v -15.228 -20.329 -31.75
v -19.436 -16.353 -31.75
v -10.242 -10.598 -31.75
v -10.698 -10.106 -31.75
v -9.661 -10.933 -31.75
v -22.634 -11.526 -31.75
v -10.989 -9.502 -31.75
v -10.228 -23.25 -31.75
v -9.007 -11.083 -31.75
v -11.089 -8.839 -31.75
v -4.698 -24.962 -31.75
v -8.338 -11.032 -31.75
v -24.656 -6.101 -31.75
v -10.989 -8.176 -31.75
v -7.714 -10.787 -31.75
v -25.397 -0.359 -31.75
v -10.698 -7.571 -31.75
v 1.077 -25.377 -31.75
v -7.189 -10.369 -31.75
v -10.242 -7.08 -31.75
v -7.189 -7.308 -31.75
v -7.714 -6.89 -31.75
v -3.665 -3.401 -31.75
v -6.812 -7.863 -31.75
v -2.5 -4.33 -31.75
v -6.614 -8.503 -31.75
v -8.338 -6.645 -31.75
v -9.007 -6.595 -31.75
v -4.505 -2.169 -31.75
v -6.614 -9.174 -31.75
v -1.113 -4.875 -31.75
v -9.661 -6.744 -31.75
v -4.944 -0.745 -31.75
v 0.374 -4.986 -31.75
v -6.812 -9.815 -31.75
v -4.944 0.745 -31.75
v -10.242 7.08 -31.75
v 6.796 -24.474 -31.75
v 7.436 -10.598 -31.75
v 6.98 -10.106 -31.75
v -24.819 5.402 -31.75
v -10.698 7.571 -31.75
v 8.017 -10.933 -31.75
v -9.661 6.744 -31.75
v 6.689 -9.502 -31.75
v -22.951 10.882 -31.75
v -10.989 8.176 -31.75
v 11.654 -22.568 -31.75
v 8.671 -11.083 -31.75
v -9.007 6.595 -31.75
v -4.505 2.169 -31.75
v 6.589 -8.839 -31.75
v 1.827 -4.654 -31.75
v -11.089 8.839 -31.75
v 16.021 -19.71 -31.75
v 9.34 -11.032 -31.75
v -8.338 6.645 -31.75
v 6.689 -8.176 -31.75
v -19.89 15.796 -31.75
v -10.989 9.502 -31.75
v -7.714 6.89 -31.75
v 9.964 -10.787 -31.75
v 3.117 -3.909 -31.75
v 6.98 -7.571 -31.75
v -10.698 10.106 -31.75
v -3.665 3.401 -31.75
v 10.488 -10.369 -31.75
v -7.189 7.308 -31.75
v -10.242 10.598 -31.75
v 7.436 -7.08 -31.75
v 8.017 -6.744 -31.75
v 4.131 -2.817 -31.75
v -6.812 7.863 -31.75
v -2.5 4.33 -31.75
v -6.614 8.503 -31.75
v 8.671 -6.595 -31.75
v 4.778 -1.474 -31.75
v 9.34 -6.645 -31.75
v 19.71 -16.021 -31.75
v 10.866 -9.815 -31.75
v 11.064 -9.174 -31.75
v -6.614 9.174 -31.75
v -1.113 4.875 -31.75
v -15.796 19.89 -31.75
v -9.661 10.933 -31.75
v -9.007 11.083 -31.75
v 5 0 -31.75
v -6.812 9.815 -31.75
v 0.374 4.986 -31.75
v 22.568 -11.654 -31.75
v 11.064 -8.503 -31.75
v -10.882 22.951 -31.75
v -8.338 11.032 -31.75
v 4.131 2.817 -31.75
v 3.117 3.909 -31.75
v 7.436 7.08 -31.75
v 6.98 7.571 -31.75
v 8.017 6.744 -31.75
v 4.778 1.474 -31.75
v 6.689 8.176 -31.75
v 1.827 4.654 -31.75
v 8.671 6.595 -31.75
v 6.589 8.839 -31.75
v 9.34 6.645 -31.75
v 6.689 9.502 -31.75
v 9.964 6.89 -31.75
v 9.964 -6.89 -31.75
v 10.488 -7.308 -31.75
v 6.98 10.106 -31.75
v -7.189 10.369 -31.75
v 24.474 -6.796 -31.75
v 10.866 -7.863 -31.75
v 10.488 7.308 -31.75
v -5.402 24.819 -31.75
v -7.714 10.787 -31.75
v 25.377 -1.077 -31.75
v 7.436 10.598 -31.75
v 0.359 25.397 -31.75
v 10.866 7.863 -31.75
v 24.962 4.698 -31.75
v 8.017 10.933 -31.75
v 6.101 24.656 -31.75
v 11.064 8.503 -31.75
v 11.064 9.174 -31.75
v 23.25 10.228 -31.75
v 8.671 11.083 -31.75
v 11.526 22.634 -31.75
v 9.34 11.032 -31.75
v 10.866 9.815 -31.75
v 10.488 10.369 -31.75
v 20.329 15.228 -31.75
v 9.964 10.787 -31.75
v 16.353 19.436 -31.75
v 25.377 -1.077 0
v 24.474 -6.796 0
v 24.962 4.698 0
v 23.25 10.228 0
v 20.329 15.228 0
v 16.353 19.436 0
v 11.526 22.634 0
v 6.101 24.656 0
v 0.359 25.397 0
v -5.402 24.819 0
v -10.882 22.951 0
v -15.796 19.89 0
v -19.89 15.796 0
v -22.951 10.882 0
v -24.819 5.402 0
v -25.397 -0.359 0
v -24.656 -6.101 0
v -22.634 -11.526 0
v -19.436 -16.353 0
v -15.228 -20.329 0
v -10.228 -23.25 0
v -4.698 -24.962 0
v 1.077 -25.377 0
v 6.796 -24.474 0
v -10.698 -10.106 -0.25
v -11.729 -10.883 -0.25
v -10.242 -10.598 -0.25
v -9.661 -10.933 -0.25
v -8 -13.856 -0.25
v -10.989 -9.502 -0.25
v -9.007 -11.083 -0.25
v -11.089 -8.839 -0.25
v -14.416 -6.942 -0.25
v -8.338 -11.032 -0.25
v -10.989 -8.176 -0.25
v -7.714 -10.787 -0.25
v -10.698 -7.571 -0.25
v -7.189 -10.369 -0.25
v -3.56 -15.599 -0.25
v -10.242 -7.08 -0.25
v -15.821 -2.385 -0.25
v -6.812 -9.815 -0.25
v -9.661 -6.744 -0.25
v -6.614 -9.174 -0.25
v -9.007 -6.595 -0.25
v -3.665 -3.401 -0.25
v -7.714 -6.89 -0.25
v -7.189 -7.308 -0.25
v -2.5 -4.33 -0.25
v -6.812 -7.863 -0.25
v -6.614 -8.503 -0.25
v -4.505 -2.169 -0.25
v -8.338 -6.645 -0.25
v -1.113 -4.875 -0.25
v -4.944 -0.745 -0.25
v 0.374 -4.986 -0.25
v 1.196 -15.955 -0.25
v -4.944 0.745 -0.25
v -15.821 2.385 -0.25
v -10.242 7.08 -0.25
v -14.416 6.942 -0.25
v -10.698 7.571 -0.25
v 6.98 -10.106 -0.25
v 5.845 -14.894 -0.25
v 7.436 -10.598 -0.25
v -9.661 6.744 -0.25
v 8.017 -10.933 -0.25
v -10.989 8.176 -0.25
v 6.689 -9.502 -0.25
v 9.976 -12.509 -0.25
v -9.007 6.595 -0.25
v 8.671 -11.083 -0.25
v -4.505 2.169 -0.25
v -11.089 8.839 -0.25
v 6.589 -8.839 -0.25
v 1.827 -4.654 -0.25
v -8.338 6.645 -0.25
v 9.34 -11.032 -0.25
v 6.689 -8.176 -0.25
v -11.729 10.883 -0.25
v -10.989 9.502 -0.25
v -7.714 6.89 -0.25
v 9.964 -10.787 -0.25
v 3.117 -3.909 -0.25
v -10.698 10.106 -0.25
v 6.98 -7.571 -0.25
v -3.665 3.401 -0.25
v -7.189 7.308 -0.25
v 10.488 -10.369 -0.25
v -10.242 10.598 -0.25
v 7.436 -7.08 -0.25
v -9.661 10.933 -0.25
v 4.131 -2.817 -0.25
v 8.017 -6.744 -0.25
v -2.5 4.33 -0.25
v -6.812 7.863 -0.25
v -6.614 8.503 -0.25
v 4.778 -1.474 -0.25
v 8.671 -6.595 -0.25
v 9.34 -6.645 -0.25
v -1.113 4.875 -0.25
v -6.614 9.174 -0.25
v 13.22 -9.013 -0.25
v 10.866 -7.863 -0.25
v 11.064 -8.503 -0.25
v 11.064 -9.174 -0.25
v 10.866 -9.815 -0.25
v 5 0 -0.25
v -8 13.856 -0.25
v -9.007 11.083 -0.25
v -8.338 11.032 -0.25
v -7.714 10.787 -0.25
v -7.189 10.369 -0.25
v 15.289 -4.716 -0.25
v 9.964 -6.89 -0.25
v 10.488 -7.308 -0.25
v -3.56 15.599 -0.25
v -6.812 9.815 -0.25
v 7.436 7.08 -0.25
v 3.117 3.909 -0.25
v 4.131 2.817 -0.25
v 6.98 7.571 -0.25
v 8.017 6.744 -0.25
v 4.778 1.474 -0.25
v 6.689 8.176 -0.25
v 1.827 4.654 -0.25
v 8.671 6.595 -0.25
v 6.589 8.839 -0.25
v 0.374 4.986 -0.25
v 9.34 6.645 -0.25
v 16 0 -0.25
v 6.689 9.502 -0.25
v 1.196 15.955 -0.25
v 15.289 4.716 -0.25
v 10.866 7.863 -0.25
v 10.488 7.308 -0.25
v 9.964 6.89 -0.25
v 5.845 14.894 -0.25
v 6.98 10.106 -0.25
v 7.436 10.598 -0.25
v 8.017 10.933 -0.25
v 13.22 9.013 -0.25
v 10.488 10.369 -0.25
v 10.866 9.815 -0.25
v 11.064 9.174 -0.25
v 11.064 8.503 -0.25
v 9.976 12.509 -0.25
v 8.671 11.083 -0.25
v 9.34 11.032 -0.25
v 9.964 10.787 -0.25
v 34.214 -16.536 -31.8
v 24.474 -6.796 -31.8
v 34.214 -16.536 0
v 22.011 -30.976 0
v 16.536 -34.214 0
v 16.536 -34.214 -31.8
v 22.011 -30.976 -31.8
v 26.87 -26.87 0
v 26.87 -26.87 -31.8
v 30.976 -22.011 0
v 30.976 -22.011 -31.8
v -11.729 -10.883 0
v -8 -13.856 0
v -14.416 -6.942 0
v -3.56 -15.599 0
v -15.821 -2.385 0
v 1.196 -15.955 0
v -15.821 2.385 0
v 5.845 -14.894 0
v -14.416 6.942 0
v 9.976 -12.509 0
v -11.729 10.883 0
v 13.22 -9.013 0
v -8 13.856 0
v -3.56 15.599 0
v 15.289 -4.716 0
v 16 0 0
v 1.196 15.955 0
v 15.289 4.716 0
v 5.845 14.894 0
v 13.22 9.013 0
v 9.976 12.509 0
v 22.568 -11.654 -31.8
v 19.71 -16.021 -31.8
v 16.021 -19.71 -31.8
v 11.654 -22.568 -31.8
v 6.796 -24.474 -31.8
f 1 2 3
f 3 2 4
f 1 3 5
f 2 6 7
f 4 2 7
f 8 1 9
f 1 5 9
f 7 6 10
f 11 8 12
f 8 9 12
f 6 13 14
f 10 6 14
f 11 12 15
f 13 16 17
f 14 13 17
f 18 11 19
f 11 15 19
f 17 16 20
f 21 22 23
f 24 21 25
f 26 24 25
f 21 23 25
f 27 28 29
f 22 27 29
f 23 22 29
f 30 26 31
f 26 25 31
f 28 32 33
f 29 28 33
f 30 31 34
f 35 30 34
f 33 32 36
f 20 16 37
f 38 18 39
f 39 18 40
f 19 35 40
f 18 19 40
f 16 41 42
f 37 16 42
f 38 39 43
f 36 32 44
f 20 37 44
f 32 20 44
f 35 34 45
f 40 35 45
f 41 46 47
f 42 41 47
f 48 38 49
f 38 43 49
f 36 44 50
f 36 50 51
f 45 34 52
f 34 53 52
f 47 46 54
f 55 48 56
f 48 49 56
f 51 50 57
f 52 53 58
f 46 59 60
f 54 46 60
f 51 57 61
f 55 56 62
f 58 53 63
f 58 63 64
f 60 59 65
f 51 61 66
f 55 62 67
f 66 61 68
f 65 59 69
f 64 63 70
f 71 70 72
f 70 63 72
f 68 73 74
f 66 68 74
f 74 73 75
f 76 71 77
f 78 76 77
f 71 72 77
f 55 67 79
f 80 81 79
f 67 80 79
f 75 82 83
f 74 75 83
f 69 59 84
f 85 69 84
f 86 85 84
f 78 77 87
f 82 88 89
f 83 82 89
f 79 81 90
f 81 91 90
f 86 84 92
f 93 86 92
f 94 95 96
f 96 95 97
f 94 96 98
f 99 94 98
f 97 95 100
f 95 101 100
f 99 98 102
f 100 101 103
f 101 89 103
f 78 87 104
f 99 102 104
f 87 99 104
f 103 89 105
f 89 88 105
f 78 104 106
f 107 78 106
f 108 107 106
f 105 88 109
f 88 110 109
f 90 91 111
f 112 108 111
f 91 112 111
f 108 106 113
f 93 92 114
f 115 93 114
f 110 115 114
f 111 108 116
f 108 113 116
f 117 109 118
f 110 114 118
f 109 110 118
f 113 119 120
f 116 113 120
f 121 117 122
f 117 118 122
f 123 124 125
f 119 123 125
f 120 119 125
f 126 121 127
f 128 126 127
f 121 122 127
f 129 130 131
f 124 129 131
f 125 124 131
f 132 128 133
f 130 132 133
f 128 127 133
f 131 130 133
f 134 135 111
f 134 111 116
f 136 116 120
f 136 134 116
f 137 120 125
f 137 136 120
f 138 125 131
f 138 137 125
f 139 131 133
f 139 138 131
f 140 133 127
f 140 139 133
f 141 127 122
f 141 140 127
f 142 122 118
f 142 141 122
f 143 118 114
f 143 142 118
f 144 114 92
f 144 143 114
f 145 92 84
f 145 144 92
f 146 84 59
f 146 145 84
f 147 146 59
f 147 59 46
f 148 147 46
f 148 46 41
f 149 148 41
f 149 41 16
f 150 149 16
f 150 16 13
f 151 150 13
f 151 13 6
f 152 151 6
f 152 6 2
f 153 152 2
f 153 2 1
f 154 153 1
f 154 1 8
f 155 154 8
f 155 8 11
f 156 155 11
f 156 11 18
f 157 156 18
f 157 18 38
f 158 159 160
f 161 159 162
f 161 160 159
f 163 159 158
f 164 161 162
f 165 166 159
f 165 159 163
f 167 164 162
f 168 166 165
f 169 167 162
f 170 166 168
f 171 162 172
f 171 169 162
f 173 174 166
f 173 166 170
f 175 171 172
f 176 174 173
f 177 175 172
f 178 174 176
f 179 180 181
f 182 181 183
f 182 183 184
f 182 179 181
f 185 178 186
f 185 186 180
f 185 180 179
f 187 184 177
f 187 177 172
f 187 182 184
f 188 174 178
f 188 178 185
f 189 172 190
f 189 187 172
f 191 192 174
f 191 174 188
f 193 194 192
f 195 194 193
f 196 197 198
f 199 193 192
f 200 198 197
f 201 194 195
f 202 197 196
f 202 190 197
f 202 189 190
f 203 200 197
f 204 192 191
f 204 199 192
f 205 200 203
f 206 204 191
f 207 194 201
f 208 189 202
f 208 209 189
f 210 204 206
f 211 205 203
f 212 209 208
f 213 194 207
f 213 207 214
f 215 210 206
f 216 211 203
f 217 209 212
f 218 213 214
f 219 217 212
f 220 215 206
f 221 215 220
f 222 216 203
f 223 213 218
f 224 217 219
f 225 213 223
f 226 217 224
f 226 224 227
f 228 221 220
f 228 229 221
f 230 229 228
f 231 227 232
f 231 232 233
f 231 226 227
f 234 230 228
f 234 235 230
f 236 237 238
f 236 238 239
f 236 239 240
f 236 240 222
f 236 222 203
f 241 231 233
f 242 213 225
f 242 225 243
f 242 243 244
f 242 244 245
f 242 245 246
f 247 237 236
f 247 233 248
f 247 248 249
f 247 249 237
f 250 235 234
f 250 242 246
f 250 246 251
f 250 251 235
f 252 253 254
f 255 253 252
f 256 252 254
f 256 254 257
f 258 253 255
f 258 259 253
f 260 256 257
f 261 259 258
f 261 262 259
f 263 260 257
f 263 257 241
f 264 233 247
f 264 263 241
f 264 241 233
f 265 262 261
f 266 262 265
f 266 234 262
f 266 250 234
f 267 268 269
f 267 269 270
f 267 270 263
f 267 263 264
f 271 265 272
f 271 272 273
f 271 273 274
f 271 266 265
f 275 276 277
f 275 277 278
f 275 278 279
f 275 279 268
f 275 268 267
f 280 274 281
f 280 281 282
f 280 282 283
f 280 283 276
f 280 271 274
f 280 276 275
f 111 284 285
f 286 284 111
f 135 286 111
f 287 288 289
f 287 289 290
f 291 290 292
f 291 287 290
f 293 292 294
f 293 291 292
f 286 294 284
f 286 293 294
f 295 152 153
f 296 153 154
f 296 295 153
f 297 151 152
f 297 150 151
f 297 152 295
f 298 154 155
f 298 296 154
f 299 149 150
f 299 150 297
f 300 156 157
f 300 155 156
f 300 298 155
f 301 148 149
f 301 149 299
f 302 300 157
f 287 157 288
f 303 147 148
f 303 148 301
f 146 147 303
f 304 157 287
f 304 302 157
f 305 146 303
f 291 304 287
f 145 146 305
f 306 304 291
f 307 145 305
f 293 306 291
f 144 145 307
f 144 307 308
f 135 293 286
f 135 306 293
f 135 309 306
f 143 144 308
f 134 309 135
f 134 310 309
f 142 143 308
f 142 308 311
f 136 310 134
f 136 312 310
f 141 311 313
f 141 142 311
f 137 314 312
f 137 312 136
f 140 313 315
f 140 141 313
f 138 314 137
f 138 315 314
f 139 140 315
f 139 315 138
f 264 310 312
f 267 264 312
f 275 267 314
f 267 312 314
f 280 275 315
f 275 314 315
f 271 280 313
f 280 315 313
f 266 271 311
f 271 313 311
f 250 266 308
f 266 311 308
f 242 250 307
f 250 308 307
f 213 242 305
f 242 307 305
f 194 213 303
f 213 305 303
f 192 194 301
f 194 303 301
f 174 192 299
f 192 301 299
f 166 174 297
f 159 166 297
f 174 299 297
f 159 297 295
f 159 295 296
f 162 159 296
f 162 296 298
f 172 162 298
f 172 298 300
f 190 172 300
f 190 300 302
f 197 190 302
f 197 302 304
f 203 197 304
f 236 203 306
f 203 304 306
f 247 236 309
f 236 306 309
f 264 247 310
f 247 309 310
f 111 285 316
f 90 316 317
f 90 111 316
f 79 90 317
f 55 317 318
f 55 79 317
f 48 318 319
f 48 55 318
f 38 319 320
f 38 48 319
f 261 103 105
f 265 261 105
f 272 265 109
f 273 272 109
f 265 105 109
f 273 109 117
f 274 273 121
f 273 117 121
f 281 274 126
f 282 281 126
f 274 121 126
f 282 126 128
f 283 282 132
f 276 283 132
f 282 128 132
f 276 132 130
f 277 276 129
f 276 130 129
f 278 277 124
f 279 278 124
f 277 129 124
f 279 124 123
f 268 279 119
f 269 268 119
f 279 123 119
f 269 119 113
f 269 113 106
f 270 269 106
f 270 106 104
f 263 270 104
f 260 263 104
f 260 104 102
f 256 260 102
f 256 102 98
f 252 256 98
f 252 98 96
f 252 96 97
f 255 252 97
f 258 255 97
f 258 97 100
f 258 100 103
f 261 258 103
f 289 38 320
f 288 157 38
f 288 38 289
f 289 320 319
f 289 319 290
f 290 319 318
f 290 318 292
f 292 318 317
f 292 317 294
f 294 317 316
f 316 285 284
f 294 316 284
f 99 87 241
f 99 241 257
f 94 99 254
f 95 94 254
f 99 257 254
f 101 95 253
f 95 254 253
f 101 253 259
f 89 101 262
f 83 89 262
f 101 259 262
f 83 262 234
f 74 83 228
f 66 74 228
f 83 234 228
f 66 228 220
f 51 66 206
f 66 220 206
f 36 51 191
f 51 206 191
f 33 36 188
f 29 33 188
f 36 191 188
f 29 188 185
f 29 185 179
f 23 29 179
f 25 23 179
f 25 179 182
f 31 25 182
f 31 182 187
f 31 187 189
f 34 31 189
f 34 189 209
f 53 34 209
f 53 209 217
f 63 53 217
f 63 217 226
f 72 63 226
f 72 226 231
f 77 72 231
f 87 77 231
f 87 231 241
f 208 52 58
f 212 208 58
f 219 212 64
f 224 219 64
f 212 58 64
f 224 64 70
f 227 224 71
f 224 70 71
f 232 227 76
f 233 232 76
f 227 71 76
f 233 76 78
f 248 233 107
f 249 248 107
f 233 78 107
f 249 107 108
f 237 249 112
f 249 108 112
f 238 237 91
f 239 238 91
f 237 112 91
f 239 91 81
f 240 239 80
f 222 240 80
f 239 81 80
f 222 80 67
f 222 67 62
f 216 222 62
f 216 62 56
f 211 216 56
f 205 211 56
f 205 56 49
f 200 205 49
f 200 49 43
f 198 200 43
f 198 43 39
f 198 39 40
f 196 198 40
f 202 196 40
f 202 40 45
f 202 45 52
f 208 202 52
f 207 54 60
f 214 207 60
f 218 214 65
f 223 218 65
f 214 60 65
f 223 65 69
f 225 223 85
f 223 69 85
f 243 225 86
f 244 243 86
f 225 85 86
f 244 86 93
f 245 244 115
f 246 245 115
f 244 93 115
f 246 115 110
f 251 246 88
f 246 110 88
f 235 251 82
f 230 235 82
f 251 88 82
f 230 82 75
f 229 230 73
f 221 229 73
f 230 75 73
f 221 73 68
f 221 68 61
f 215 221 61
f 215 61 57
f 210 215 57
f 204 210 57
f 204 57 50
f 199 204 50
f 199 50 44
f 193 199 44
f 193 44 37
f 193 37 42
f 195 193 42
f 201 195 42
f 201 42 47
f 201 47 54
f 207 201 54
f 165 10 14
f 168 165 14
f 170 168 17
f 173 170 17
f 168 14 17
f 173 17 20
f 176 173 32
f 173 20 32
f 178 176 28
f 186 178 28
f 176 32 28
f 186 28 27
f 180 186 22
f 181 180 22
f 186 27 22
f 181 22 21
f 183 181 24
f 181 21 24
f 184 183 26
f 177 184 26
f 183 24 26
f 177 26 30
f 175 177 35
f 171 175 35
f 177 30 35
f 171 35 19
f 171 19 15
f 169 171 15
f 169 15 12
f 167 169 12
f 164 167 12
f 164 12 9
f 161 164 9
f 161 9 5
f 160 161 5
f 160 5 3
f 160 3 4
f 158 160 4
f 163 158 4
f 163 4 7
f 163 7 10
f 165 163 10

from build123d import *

# Parameters (mm, degrees)
SKETCH1_R            = 25.4
BOSS_EXTRUDE1_DEPTH  = 31.75
SKETCH2_R            = 16
CUT_EXTRUDE1_DEPTH   = 0.25
M4_CLEARANCE_HOLE1_D = 4.5
SKETCH6_R            = 5
CUT_EXTRUDE2_DEPTH   = 48.77624933
BOSS_EXTRUDE2_DEPTH  = 31.8


with BuildPart() as part:
    # Sketch1 → Boss-Extrude1 (new body)
    with BuildSketch(Plane.XY):
        Circle(SKETCH1_R)
    extrude(amount=-BOSS_EXTRUDE1_DEPTH)

    # Sketch2 → Cut-Extrude1 (cut)
    with BuildSketch(Plane.XY):
        Circle(SKETCH2_R)
    extrude(amount=-CUT_EXTRUDE1_DEPTH, mode=Mode.SUBTRACT)

    # M4 Clearance Hole1 (through all)
    with Locations(Plane.XY.offset(-0.25)):
        with Locations((-8.838834765, 8.838834765), (8.838834765, 8.838834765), (-8.838834765, -8.838834765), (8.838834765, -8.838834765)):
            Hole(M4_CLEARANCE_HOLE1_D / 2)

    # Sketch6 → Cut-Extrude2 (cut, through all)
    with BuildSketch(Plane.XY.offset(-0.25)):
        Circle(SKETCH6_R)
    extrude(amount=-CUT_EXTRUDE2_DEPTH, mode=Mode.SUBTRACT)

    # Sketch8 → Boss-Extrude2 (add)
    with BuildSketch(Plane.XY):
        with BuildLine():
            Line((6.796221999, -24.473891528), (16.535857352, -34.213526881))
            ThreePointArc((16.535857352, -34.213526881), (26.870057685, -26.870057685), (34.213526881, -16.535857352))
            Line((34.213526881, -16.535857352), (24.473891528, -6.796221999))
            ThreePointArc((24.473891528, -6.796221999), (17.960512242, -17.960512242), (6.796221999, -24.473891528))
        make_face()
    extrude(amount=-BOSS_EXTRUDE2_DEPTH)


solid = part.part
